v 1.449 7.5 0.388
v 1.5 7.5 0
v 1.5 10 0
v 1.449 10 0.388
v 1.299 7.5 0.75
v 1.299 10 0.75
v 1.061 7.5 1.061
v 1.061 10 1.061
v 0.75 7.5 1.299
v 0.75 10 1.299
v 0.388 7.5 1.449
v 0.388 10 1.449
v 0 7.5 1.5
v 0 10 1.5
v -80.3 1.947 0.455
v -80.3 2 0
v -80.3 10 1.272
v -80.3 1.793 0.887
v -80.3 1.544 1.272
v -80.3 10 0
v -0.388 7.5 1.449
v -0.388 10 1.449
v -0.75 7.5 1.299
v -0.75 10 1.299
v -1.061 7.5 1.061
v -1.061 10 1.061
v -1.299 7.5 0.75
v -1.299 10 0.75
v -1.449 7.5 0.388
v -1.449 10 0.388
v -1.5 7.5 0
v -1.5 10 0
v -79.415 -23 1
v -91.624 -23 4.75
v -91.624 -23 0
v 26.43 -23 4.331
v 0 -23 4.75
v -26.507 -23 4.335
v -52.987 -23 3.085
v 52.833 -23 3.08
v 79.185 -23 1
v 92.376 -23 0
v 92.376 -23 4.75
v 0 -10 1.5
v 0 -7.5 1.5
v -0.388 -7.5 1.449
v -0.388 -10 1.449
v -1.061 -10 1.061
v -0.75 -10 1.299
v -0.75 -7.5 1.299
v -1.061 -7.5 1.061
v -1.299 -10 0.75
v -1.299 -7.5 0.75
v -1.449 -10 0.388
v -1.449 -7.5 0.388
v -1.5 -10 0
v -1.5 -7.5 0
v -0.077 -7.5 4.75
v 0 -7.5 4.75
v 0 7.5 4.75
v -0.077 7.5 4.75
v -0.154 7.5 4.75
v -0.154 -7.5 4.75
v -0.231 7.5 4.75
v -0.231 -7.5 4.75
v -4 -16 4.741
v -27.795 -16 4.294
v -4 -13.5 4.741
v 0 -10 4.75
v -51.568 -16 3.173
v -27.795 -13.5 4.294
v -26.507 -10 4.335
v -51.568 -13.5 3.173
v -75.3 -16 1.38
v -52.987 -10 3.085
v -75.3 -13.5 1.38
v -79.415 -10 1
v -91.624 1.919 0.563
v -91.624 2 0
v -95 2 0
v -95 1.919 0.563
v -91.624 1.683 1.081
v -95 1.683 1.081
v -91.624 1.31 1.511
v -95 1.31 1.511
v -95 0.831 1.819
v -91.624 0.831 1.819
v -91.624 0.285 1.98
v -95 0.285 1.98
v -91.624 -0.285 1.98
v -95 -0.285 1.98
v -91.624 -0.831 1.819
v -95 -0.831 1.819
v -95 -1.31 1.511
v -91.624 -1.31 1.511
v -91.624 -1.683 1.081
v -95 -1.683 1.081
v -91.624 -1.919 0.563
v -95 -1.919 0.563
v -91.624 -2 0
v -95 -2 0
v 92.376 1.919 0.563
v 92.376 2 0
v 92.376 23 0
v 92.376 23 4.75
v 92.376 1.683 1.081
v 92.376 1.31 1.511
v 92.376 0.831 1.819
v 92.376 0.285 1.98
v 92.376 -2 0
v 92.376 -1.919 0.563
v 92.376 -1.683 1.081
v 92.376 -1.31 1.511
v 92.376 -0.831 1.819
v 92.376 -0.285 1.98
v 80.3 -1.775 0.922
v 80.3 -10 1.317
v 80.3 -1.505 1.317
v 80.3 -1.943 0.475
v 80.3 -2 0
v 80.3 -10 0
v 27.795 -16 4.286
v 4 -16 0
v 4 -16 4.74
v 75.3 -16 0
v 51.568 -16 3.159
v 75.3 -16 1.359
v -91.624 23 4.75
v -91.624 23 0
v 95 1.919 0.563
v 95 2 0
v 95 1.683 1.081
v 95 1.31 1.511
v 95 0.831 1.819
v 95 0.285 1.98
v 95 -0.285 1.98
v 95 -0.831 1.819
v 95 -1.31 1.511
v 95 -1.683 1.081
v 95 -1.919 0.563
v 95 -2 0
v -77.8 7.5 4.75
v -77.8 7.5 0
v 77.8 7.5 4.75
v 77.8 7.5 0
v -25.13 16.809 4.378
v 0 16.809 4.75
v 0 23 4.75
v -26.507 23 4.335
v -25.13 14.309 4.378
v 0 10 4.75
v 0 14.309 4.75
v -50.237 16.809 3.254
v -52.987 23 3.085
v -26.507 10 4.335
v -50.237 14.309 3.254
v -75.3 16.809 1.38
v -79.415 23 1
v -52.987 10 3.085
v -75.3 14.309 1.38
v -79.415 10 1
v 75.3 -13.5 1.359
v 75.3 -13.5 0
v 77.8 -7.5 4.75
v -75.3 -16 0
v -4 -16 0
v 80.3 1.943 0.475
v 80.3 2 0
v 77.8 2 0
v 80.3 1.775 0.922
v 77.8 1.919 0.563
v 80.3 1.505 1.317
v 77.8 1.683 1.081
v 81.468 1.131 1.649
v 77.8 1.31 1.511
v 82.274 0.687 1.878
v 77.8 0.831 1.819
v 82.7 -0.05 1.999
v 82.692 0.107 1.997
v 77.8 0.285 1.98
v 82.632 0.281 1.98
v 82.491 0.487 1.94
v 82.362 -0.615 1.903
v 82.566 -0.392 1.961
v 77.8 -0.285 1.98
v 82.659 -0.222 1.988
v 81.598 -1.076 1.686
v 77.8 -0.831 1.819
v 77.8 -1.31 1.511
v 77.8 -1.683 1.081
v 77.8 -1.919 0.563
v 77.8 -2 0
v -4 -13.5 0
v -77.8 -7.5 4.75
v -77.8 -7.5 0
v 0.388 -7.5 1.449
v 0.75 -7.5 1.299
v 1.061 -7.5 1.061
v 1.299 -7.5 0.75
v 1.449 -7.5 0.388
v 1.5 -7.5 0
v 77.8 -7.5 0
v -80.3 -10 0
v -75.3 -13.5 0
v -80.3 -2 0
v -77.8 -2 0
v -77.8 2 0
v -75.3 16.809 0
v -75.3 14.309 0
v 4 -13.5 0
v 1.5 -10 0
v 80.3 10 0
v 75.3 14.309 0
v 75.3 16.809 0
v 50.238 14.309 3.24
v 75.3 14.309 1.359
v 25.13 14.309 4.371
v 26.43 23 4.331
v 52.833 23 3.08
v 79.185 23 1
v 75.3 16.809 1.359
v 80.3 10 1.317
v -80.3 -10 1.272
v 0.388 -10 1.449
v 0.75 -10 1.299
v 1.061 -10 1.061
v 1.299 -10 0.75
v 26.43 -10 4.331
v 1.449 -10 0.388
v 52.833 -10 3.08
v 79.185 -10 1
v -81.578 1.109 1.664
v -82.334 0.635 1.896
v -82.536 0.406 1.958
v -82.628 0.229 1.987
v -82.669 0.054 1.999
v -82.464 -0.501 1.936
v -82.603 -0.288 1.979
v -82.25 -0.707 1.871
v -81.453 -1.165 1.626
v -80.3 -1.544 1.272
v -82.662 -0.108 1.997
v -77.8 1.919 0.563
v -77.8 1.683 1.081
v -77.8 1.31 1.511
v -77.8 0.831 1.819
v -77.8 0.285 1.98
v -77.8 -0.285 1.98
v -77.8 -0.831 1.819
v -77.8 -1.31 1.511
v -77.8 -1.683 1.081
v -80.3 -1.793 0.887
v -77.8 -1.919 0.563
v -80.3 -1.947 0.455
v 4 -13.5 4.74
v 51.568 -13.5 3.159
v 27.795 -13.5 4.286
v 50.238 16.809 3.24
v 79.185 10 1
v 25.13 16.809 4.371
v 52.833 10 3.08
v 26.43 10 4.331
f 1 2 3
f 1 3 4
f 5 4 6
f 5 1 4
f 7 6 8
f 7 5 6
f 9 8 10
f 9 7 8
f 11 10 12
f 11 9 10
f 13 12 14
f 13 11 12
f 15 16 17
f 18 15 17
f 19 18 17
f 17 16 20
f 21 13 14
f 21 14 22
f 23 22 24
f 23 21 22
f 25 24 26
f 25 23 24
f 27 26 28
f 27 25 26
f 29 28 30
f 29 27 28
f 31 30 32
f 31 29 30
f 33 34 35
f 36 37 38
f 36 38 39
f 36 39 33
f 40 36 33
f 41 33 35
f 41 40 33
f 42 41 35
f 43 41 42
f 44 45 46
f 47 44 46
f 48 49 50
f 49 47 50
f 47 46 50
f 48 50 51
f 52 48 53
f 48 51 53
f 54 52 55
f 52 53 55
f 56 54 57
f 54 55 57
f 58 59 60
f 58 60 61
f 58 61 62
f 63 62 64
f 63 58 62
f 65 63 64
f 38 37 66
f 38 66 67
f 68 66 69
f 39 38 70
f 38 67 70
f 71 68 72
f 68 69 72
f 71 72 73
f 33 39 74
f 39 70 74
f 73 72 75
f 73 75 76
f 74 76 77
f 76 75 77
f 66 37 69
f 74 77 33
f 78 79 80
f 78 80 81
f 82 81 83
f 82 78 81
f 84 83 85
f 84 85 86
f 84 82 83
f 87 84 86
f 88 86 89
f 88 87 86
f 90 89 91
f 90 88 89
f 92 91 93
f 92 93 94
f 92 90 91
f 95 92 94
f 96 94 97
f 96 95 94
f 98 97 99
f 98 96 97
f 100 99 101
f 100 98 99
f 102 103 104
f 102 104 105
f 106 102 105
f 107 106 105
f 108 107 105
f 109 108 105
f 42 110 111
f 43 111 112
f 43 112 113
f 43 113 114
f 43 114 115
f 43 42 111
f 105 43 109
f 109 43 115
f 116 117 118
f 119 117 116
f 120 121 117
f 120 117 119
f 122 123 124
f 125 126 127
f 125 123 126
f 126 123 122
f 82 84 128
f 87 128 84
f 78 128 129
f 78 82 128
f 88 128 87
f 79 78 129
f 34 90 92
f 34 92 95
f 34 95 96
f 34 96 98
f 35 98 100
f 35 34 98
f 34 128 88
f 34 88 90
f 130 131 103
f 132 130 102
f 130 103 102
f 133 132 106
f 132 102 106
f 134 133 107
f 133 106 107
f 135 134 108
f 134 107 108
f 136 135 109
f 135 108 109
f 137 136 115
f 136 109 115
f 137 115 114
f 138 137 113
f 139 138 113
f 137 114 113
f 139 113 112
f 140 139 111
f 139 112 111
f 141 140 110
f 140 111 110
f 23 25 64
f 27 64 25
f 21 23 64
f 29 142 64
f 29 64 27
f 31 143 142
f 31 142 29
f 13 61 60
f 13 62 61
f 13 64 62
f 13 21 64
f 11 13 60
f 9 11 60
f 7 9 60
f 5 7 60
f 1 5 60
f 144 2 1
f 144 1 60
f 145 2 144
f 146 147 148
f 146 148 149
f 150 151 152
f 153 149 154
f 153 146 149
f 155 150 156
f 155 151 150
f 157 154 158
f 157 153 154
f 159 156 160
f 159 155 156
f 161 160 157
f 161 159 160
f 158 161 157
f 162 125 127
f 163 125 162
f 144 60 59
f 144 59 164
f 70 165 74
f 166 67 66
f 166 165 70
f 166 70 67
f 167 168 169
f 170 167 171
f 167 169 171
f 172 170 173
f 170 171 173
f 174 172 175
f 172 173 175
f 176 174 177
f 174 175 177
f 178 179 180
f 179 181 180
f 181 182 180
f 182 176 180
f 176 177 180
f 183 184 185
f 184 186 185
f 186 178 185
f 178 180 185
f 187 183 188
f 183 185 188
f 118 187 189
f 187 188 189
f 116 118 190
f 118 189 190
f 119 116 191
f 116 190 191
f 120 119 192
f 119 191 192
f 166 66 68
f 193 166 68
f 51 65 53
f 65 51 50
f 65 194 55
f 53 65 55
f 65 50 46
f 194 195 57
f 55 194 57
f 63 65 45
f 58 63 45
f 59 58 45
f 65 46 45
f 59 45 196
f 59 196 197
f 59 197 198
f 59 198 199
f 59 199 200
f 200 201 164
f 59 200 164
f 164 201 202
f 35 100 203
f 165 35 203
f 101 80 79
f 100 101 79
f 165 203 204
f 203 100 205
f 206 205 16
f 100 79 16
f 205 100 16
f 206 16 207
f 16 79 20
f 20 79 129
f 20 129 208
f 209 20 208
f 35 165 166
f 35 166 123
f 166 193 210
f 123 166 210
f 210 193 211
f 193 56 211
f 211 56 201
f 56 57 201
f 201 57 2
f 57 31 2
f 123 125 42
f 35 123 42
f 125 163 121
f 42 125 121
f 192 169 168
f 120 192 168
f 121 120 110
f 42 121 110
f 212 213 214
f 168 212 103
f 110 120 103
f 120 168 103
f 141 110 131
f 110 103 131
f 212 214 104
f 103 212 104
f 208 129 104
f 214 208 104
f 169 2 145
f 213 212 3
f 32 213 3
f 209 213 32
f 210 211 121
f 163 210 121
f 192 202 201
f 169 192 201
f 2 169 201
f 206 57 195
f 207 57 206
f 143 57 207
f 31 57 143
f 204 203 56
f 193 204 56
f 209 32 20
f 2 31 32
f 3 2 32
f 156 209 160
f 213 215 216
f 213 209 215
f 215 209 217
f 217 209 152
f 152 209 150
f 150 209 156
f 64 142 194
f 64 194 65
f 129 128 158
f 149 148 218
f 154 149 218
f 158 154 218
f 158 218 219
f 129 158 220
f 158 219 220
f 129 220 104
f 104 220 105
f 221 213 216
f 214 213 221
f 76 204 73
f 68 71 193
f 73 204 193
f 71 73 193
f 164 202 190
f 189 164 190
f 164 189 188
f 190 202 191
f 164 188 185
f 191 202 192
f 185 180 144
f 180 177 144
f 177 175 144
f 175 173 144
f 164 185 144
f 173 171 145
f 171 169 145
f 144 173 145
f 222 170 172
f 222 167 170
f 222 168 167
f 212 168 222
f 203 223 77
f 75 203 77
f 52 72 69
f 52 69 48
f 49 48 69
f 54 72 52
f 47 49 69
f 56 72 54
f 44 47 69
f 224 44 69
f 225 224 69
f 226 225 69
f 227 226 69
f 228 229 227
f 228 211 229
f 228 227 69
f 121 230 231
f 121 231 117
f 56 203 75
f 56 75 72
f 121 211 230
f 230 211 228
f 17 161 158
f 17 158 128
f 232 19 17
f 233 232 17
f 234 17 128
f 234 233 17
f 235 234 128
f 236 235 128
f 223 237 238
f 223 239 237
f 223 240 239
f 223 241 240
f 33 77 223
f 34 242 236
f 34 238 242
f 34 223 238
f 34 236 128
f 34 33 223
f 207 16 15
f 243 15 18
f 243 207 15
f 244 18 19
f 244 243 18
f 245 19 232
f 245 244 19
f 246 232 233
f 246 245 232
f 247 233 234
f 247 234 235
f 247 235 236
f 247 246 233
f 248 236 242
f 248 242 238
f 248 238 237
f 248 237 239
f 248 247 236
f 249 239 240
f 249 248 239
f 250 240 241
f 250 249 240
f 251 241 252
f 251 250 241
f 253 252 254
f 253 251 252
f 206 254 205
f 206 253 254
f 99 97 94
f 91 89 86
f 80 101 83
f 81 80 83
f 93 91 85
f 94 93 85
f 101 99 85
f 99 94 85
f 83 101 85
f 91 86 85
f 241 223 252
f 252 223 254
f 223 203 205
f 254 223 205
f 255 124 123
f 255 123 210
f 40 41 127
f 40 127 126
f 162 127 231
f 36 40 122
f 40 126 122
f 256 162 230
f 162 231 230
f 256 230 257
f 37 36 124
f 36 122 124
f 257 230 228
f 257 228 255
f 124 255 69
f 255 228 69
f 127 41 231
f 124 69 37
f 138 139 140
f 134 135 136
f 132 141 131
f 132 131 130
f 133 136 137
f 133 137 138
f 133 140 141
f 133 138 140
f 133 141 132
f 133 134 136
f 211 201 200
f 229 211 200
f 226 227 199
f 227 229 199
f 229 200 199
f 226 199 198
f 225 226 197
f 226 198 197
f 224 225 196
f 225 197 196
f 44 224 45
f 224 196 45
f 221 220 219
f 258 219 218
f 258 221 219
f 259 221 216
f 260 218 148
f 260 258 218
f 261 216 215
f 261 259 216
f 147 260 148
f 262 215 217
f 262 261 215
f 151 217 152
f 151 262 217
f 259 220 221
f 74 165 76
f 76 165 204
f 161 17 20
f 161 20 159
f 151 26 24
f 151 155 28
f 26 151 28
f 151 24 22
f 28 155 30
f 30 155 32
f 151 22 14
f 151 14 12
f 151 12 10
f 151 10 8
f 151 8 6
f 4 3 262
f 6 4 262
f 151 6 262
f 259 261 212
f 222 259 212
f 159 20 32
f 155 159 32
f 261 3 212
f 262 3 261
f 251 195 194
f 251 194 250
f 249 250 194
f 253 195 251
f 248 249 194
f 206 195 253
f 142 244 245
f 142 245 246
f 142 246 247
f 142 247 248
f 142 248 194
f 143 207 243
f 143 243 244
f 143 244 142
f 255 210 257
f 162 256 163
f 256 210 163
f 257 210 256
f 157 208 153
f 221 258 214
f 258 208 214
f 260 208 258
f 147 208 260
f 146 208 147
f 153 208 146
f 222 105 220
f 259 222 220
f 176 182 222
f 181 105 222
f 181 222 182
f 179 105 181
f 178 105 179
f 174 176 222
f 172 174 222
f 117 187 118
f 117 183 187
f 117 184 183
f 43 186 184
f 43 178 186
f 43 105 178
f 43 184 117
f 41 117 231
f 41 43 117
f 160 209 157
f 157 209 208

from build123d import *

# Parameters (mm, degrees)
F3_DEPTH      = 23
F3_DEPTH_BACK = 23
F2_W          = 71.3
F2_H          = 2.5
F2_W_2        = 160.6
F2_H_2        = 20
F2_W_3        = 155.6
F2_H_3        = 15
F2_W_4        = 150.6
F4_DEPTH      = 5
F7_DEPTH      = 95
F7_DEPTH_BACK = 95
F8_DEPTH      = 12
F8_DEPTH_BACK = 12
F9_DEPTH      = 4.75


# Not quite as in the source:
# - a feature names something its author has since deleted; it is built from what else it names


with BuildPart() as f3:
    # F0 (on Front) → F3 (new body, two sides)
    with BuildSketch(Plane.XZ) as f3_sk:
        with BuildLine():
            Line((0, 1.5), (0, 0))
            Line((0, 0), (1.5, 0))
            ThreePointArc((1.5, 0), (1.0606601718, 1.0606601718), (0, 1.5))
        make_face()
        with BuildLine():
            ThreePointArc((0, 1.5), (-1.0606601718, 1.0606601718), (-1.5, 0))
            Line((-1.5, 0), (0, 0))
            Line((0, 0), (0, 1.5))
        make_face()
        with BuildLine():
            Line((-91.6240630262, 0), (-79.4154876804, 0))
            Line((-79.4154876804, 0), (-1.5, 0))
            ThreePointArc((-1.5, 0), (-1.0606601718, 1.0606601718), (0, 1.5))
            Line((0, 1.5), (0, 4.75))
            ThreePointArc((0, 4.75), (-39.7521168613, 3.8147080292), (-79.4154876804, 1))
            Line((-79.4154876804, 1), (-91.6240630262, 4.75))
            Line((-91.6240630262, 4.75), (-91.6240630262, 0))
        make_face()
        with BuildLine():
            Line((0, 4.75), (0, 1.5))
            ThreePointArc((0, 1.5), (1.0606601718, 1.0606601718), (1.5, 0))
            Line((1.5, 0), (79.1845123196, 0))
            Line((79.1845123196, 0), (92.3759369738, 0))
            Line((92.3759369738, 0), (92.3759369738, 4.75))
            Line((92.3759369738, 4.75), (79.1845123196, 1))
            ThreePointArc((79.1845123196, 1), (39.6365002683, 3.8092528426), (0, 4.75))
        make_face()
    extrude(amount=F3_DEPTH)
    extrude(f3_sk.sketch, amount=-F3_DEPTH_BACK)

    # F2 (on Top) → F4 (cut)
    with BuildSketch(Plane.XY):
        with Locations((-39.65, -14.75)):
            Rectangle(F2_W, F2_H)
        with Locations((39.65, -14.75)):
            Rectangle(F2_W, F2_H)
        Rectangle(F2_W_2, F2_H_2)
        Rectangle(F2_W_3, F2_H_3, mode=Mode.SUBTRACT)
        with Locations((0, 15.5593407378)):
            Rectangle(F2_W_4, F2_H)
    extrude(amount=F4_DEPTH, mode=Mode.SUBTRACT)

    # F6 (on Right) → F7 (join, two sides)
    with BuildSketch(Plane.YZ) as f7_sk:
        with BuildLine():
            Line((-2, 0), (2, 0))
            ThreePointArc((2, 0), (0, 2), (-2, 0))
        make_face()
    extrude(amount=F7_DEPTH)
    extrude(f7_sk.sketch, amount=-F7_DEPTH_BACK)

    # F0 (on Front) → F8 (join, two sides)
    with BuildSketch(Plane.XZ) as f8_sk:
        with BuildLine():
            Line((0, 1.5), (0, 0))
            Line((0, 0), (1.5, 0))
            ThreePointArc((1.5, 0), (1.0606601718, 1.0606601718), (0, 1.5))
        make_face()
        with BuildLine():
            ThreePointArc((0, 1.5), (-1.0606601718, 1.0606601718), (-1.5, 0))
            Line((-1.5, 0), (0, 0))
            Line((0, 0), (0, 1.5))
        make_face()
    extrude(amount=F8_DEPTH)
    extrude(f8_sk.sketch, amount=-F8_DEPTH_BACK)

    # F2 (on Top) → F9 (join)
    with BuildSketch(Plane.XY):
        Rectangle(F2_W_3, F2_H_3)
    extrude(amount=F9_DEPTH)


solid = f3.part
